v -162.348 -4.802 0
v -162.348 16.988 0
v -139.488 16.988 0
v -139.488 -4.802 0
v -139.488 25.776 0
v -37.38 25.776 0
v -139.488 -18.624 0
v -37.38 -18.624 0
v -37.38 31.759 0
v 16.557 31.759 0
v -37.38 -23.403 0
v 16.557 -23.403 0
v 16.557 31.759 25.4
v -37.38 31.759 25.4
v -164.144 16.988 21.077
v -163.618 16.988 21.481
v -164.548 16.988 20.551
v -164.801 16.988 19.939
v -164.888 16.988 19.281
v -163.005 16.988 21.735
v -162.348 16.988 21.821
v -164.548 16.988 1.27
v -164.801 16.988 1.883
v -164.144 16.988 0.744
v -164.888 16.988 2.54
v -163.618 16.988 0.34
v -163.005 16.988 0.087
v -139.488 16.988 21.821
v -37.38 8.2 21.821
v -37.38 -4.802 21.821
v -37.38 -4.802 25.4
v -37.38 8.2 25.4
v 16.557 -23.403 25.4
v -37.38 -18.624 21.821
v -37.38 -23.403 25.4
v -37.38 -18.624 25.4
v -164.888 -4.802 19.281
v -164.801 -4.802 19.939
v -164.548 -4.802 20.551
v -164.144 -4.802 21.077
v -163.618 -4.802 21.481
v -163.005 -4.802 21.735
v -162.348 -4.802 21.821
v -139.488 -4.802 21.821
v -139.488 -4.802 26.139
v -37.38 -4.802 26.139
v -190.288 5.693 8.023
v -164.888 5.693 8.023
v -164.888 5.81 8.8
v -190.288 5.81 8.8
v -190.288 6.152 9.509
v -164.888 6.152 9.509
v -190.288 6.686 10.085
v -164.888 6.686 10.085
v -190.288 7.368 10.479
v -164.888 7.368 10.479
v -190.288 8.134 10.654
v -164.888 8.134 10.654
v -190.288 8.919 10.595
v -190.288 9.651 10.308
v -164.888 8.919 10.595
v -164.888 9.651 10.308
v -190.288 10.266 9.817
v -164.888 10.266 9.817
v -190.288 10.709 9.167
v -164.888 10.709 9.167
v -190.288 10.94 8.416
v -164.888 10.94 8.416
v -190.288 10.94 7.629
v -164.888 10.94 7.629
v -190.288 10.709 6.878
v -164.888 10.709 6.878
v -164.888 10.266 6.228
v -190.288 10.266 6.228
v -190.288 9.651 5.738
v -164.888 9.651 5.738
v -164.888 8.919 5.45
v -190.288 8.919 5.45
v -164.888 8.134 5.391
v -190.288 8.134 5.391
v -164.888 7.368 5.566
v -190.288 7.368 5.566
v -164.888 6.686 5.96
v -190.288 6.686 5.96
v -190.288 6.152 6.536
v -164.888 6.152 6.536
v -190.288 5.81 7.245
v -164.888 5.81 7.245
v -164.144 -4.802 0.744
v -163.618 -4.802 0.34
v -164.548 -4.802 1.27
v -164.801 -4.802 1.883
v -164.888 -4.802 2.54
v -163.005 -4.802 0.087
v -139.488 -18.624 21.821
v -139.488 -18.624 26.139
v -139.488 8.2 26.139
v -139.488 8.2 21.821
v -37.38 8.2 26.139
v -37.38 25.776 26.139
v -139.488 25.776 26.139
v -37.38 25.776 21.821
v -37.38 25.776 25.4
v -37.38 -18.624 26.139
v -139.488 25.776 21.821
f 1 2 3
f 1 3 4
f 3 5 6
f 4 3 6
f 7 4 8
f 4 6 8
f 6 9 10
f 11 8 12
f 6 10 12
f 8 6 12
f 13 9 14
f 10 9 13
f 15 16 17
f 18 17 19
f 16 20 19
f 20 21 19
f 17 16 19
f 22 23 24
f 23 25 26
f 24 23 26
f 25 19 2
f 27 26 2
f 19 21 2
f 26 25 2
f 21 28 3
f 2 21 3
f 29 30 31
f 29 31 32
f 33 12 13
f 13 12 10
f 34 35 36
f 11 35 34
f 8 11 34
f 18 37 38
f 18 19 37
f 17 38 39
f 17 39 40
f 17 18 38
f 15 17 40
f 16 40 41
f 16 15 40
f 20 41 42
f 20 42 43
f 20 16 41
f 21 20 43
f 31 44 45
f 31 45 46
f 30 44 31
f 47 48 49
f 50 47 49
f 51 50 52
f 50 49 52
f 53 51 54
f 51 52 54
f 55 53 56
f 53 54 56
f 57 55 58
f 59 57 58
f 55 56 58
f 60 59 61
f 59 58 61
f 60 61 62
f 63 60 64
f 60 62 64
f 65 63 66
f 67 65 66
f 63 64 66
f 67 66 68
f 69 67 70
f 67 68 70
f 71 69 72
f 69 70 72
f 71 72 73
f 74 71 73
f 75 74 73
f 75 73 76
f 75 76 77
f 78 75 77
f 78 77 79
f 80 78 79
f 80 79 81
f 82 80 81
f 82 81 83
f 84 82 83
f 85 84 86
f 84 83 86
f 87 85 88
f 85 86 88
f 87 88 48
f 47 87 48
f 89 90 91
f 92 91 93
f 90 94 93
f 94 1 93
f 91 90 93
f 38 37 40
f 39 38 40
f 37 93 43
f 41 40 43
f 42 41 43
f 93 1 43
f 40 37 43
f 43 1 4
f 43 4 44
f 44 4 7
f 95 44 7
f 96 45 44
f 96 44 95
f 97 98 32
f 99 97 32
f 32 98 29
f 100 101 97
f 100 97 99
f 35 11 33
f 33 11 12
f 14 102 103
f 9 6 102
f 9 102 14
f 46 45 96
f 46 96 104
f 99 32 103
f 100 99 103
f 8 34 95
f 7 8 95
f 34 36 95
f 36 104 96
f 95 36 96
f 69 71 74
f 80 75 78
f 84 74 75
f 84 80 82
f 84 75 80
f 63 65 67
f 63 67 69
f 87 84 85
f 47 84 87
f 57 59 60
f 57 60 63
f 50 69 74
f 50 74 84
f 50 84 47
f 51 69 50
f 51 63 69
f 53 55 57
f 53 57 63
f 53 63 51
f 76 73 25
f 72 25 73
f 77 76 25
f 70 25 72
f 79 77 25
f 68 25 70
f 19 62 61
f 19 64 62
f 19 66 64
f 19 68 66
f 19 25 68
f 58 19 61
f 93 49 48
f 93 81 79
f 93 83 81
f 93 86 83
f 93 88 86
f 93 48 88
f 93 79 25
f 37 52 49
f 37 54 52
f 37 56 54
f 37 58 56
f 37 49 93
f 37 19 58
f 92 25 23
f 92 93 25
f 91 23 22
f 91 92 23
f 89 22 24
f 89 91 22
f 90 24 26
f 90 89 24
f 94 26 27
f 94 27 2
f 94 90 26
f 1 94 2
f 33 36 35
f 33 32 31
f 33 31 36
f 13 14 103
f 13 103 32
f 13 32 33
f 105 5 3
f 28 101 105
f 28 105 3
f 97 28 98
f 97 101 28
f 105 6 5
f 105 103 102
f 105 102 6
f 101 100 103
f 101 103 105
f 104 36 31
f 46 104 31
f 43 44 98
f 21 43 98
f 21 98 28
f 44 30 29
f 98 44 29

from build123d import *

# Parameters (mm, degrees)
F0_W      = 53.9365671575
F0_H      = 55.1624000072
F1_DEPTH  = 25.4
F2_W      = 18.6239220202
F2_H      = 16.7940715328
F2_W_2    = 25.7758889347
F3_DEPTH  = 102.108
F4_W      = 102.108
F4_H      = 13.8221322559
F4_H_2    = 17.5757771358
F5_DEPTH  = 4.318
F6_DEPTH  = 5.0270510837
F8_DEPTH  = 25.4
F9_R      = 2.6384462804
F10_DEPTH = 25.4
F11_R     = 2.54
F12_R     = 2.54


with BuildPart() as f1:
    # F0 (on Top) → F1 (new body)
    with BuildSketch(Plane.XY):
        with Locations((-10.4117374867, 4.1782557964)):
            Rectangle(F0_W, F0_H)
    extrude(amount=F1_DEPTH)

    # F2 (on face) → F3 (join)
    with BuildSketch(Plane(origin=(-37.3800210655, 0, 0), x_dir=(0, -1, 0), z_dir=(-1, 0, 0))):
        with Locations((9.3119610101, 13.4240868501)):
            Rectangle(F2_W, F2_H)
        with Locations((-12.8879444674, 13.4240868501)):
            Rectangle(F2_W_2, F2_H)
    extrude(amount=F3_DEPTH)

    # F4 (on face) → F5 (join)
    with BuildSketch(Plane.XY.offset(21.8211226165)):
        with Locations((-88.4340210655, -11.7128558923)):
            Rectangle(F4_W, F4_H)
        with Locations((-88.4340210655, 16.9880003668)):
            Rectangle(F4_W, F4_H_2)
    extrude(amount=F5_DEPTH)

    # F6 (add, through all): a face of the model
    f6_faces = [f1.faces().sort_by_distance(p)[0] for p in [
        (-88.4340210655, 3.5759834573, 5.0270510837),
    ]]
    extrude(f6_faces, amount=F6_DEPTH)

    # F7 (on face) → F8 (join)
    with BuildSketch(Plane(origin=(-139.4880210655, 0, 0), x_dir=(0, -1, 0), z_dir=(-1, 0, 0))):
        Polygon((-16.9880003668, 0), (4.8017897643, 0), (4.8017897643, 21.8211226165), (-8.2001117989, 21.8211226165), (-16.9880003668, 21.8211226165), align=None)
    extrude(amount=F8_DEPTH)

    # F9 (on face) → F10 (join)
    with BuildSketch(Plane(origin=(-164.8880210655, 0, 0), x_dir=(0, -1, 0), z_dir=(-1, 0, 0))):
        with Locations((-8.3315027878, 8.0225486308)):
            Circle(F9_R)
    extrude(amount=F10_DEPTH)

    # F11
    f11_edges = [f1.edges().sort_by_distance(p)[0] for p in [
        (-164.888021, 6.093105, 21.821123),
    ]]
    fillet(f11_edges, radius=F11_R)

    # F12
    f12_edges = [f1.edges().sort_by_distance(p)[0] for p in [
        (-164.888021, 6.093105, 0),
    ]]
    fillet(f12_edges, radius=F12_R)


solid = f1.part
